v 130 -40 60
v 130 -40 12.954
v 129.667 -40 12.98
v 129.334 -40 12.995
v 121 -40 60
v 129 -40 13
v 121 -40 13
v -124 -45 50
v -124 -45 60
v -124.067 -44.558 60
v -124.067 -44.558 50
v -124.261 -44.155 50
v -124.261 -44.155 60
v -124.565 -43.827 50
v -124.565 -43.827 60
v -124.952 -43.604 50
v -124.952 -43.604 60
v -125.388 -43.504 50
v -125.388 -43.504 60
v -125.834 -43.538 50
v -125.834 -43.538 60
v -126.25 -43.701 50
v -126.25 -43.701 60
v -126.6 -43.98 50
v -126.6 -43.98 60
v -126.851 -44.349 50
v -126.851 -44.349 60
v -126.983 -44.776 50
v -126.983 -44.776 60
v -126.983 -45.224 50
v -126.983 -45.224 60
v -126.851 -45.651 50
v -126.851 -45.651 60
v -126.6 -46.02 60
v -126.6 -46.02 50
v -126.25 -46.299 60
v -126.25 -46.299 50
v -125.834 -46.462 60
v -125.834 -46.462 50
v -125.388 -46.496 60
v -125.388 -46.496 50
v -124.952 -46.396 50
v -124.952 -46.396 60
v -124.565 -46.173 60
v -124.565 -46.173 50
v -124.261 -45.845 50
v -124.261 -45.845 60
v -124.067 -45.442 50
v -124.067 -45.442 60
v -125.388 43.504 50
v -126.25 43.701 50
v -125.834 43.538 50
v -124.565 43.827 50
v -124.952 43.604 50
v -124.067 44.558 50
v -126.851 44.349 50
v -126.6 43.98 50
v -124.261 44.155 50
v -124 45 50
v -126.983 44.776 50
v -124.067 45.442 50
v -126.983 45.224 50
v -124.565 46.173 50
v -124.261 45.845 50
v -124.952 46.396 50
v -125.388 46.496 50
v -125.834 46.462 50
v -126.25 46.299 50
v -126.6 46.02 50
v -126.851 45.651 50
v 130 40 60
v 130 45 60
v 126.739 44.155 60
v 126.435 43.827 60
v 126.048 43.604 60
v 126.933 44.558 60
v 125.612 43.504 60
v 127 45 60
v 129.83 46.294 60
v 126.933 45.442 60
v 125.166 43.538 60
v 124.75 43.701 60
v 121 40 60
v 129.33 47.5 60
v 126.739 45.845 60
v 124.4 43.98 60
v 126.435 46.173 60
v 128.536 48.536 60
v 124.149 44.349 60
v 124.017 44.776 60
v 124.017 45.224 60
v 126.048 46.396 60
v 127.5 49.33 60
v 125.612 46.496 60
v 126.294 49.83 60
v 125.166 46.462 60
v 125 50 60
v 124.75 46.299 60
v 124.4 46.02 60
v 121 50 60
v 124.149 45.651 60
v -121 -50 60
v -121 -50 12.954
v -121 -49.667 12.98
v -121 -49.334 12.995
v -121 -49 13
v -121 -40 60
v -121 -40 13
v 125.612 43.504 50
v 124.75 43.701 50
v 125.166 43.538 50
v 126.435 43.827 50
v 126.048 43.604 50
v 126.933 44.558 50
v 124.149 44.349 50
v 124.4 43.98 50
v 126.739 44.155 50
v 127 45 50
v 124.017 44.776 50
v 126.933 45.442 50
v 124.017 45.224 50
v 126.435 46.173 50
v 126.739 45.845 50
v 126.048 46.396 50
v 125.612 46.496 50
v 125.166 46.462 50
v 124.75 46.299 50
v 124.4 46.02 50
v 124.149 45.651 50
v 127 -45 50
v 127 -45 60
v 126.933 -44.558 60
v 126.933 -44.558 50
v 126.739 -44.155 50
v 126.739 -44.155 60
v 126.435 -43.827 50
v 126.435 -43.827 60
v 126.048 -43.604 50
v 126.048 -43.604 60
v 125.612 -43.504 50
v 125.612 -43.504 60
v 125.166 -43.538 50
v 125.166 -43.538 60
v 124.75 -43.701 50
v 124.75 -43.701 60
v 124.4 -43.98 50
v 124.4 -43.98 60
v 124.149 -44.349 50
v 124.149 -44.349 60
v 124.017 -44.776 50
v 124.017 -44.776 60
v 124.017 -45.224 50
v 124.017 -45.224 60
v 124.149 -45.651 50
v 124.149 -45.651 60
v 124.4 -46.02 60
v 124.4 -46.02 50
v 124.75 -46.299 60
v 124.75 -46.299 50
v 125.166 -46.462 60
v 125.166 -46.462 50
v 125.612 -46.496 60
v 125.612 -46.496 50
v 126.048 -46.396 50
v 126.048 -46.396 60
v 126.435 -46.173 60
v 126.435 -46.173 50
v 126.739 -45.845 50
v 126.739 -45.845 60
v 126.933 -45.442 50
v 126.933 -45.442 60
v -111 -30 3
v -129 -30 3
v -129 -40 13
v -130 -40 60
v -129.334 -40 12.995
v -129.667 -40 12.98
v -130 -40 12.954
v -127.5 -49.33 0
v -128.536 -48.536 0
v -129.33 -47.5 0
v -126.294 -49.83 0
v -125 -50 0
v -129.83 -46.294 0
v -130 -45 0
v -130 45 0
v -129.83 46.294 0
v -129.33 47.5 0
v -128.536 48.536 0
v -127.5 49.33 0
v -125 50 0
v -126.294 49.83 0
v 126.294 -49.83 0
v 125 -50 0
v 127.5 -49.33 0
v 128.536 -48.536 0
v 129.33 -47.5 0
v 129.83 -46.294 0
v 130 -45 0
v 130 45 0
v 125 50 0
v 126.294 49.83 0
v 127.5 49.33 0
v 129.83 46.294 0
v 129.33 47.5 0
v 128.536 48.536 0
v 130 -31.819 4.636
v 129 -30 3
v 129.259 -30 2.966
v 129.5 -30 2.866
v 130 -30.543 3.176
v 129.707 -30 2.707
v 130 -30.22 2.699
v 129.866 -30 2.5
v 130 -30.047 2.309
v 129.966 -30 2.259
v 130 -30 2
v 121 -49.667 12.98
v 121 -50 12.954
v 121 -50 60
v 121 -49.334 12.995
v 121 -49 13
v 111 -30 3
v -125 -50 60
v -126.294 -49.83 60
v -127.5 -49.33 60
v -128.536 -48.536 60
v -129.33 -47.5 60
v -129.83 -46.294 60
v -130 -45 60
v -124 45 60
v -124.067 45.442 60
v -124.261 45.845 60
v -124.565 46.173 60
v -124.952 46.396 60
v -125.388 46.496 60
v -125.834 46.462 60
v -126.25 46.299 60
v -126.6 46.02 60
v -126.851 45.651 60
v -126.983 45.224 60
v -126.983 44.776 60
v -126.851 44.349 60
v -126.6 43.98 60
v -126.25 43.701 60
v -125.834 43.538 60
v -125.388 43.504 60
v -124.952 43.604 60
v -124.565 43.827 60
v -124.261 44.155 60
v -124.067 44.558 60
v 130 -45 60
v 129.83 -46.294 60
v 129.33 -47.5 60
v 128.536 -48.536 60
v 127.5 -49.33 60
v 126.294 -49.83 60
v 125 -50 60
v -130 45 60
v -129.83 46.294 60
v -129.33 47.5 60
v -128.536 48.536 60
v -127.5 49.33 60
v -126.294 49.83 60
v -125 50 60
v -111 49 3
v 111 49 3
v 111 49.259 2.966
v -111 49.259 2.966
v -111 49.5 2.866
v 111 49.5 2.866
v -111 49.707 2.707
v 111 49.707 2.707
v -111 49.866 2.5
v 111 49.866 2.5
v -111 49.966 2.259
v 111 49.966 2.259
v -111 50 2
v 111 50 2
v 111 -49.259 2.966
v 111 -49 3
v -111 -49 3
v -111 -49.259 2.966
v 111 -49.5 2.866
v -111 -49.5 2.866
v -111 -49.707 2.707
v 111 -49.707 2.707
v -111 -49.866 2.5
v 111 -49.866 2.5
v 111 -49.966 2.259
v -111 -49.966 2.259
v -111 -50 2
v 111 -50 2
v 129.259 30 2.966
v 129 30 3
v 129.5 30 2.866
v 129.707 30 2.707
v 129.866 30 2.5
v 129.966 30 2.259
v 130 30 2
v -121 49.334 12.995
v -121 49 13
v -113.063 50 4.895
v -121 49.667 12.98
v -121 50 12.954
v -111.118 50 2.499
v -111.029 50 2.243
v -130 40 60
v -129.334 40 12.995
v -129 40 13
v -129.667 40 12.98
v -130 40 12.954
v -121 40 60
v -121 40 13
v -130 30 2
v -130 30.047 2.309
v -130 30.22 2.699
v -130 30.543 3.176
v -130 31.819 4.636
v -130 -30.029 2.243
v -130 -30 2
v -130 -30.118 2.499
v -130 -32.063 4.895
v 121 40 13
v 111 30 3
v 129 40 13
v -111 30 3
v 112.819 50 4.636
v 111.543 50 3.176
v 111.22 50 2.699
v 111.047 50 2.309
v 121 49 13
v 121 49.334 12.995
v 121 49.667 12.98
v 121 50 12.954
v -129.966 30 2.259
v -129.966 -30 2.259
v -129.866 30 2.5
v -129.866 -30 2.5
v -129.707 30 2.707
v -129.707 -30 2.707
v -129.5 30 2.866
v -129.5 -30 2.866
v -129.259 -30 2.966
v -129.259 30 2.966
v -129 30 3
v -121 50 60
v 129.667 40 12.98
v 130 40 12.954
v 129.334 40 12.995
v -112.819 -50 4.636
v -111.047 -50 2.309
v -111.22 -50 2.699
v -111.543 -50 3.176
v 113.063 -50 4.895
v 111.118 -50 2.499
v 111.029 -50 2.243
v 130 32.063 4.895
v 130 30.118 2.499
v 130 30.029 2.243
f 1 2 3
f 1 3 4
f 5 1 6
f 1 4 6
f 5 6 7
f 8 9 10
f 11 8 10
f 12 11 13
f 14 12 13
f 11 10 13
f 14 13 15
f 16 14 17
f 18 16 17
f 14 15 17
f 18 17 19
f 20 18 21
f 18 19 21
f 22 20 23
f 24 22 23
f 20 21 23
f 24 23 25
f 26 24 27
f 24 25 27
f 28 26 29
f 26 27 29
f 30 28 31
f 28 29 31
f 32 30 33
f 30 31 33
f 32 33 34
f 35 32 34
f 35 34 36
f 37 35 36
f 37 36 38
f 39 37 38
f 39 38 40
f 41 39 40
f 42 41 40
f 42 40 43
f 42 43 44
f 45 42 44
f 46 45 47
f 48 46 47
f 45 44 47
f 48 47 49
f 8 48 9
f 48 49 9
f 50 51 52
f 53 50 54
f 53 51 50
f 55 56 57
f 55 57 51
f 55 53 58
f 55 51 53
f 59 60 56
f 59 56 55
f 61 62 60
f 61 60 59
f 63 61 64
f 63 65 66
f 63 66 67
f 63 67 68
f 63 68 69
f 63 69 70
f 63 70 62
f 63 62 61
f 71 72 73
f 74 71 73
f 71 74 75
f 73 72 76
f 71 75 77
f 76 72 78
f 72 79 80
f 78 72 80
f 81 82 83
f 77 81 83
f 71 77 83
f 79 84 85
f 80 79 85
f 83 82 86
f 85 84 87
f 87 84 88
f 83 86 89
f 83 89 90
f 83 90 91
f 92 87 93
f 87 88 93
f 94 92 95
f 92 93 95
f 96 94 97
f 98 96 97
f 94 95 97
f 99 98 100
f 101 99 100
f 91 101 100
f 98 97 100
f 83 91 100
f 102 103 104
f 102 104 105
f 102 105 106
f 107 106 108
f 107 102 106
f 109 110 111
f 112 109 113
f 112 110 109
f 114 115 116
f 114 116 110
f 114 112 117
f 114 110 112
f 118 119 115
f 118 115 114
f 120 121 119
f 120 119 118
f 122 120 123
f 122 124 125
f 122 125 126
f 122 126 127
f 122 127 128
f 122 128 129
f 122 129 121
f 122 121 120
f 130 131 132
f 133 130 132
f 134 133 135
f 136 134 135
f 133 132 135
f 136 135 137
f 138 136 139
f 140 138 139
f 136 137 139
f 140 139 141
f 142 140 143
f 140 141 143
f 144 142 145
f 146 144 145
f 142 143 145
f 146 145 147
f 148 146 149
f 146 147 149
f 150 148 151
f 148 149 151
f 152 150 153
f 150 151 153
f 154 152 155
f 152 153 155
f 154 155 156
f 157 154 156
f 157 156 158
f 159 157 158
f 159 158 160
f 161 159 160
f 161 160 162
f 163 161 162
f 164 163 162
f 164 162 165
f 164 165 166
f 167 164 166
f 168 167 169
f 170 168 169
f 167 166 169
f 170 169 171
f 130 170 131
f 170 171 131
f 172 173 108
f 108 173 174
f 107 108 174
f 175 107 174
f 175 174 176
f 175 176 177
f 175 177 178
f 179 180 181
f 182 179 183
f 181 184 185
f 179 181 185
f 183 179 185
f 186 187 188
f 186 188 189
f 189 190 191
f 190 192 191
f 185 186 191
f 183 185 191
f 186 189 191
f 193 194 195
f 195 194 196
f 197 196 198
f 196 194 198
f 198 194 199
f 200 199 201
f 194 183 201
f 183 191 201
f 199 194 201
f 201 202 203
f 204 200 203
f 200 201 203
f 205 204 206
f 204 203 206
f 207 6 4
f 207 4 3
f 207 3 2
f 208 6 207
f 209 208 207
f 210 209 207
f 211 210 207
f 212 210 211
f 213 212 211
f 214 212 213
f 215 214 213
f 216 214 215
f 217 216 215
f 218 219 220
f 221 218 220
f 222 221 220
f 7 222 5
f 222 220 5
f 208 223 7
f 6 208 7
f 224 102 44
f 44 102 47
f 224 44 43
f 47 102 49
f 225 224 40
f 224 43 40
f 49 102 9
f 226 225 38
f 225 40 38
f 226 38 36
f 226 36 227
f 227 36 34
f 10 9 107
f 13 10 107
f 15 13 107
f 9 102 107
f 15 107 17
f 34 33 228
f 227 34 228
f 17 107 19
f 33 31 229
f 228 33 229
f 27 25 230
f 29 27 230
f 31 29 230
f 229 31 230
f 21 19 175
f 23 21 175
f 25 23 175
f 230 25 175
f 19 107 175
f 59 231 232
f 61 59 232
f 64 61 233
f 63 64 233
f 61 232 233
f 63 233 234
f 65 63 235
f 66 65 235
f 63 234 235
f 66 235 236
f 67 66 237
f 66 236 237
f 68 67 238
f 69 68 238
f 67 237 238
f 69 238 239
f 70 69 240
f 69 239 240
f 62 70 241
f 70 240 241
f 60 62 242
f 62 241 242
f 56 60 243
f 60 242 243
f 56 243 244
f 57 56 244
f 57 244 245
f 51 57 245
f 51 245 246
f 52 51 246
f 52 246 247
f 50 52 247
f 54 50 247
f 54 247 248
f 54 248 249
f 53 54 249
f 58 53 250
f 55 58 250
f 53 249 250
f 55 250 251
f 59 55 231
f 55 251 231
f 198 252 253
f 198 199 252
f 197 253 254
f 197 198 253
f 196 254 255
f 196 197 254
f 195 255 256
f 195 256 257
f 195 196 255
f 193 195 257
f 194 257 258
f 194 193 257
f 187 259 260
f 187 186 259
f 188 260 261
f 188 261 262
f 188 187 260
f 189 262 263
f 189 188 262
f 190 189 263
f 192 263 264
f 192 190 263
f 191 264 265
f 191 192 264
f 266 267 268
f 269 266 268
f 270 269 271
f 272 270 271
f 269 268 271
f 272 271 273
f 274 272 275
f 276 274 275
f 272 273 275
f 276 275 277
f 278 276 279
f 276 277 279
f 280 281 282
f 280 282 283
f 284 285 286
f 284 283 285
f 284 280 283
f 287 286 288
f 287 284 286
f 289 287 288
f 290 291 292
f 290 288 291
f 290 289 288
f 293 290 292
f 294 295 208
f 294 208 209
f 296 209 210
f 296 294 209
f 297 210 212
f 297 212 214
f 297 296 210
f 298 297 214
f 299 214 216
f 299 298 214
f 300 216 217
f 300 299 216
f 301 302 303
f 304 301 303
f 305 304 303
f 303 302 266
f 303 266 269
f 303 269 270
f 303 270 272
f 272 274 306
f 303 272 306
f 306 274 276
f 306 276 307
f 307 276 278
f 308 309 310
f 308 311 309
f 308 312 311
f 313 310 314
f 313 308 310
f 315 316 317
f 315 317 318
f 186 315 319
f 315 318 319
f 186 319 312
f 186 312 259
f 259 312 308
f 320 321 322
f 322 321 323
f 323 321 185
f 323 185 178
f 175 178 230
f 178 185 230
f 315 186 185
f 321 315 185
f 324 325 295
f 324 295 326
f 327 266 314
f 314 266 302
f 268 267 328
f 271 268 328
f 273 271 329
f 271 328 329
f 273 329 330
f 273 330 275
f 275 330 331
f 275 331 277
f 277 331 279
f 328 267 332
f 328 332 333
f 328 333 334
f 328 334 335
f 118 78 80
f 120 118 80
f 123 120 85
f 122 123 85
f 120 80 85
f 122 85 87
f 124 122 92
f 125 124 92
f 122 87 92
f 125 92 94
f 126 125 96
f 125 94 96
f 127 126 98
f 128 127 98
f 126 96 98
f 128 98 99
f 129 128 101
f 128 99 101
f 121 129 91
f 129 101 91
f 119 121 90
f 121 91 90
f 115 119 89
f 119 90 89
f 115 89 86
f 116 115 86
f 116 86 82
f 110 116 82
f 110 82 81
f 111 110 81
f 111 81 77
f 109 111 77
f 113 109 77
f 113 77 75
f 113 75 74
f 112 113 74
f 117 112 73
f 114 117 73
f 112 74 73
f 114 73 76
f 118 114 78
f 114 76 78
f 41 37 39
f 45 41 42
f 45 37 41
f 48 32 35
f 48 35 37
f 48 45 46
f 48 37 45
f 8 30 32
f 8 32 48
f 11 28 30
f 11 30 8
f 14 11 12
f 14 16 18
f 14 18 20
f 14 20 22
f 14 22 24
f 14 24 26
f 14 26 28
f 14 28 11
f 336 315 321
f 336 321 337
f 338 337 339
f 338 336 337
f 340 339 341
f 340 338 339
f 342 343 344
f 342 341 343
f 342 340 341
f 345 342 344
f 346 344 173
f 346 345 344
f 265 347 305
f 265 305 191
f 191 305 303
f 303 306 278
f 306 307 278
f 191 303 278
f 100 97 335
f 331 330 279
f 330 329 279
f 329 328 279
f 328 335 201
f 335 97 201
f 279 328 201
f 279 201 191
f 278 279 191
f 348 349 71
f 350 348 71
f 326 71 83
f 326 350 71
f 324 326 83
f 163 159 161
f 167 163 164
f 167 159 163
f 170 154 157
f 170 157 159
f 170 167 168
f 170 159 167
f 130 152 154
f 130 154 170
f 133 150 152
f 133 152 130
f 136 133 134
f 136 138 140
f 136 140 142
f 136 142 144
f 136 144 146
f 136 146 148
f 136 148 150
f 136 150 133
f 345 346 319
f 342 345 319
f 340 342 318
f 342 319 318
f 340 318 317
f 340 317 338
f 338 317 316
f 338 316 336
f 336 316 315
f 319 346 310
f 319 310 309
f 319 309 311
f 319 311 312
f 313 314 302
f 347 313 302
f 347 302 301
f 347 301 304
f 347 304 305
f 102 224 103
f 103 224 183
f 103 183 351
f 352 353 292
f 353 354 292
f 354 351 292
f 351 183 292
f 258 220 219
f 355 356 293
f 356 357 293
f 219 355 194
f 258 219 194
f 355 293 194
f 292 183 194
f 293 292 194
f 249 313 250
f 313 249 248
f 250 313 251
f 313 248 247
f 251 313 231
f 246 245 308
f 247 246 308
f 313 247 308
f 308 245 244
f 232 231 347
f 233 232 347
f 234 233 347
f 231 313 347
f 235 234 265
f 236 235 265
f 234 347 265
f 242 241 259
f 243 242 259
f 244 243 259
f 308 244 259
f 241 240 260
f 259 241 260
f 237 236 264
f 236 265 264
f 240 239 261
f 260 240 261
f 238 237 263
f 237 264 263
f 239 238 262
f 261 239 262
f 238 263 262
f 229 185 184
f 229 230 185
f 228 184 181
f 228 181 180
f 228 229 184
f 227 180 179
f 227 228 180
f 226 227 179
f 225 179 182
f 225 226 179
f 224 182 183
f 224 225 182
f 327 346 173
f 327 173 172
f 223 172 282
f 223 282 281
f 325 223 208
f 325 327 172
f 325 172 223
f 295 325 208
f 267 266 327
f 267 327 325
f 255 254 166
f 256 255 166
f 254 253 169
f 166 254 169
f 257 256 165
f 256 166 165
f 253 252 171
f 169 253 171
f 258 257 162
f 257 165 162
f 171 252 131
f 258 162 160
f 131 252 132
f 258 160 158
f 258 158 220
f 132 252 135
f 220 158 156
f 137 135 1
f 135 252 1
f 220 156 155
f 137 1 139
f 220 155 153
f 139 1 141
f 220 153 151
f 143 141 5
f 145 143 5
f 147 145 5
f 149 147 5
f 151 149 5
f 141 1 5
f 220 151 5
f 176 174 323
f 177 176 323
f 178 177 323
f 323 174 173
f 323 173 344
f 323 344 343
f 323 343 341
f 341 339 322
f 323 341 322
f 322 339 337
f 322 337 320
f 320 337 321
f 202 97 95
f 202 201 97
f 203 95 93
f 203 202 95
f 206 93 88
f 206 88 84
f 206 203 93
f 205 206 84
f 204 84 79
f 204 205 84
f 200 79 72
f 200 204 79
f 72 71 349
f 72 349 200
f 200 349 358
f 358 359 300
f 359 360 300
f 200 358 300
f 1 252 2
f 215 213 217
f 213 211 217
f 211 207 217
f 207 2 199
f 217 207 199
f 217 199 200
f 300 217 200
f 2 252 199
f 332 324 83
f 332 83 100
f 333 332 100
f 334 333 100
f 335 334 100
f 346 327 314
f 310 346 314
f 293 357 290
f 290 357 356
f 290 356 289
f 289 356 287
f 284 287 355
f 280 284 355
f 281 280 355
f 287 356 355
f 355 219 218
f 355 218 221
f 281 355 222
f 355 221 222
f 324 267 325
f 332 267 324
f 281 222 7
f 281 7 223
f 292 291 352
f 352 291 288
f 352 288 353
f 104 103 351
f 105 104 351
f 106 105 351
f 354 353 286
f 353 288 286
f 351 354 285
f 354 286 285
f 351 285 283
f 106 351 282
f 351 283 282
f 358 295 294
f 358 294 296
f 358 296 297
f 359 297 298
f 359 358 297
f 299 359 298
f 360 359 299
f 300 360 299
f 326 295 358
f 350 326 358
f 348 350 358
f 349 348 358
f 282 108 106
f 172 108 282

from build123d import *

# Parameters (mm, degrees)
SKETCH_1_W          = 260
SKETCH_1_H          = 100
EXTRUDE_1_DEPTH     = 3
SKETCH_2_W          = 9
SKETCH_2_H          = 10
EXTRUDE_2_DEPTH     = 60
FILLET_3_R          = 5
FILLET_4_R          = 1
SKETCH_3_R          = 1.5
CUT_EXTRUDE_1_DEPTH = 10
CHAMFER_1_SIZE      = 10


with BuildPart() as part:
    # 草图1 → 凸台-拉伸1 (new body)
    with BuildSketch(Plane.XY):
        Rectangle(SKETCH_1_W, SKETCH_1_H)
    extrude(amount=EXTRUDE_1_DEPTH)

    # 草图2 → 凸台-拉伸2 (add)
    with BuildSketch(Plane(origin=(0, 0, 0), x_dir=(-1, 0, 0), z_dir=(0, 0, -1))):
        with Locations((125.5, 45)):
            Rectangle(SKETCH_2_W, SKETCH_2_H)
        with Locations((125.5, -45)):
            Rectangle(SKETCH_2_W, SKETCH_2_H)
        with Locations((-125.5, -45)):
            Rectangle(SKETCH_2_W, SKETCH_2_H)
        with Locations((-125.5, 45)):
            Rectangle(SKETCH_2_W, SKETCH_2_H)
    extrude(amount=-EXTRUDE_2_DEPTH)

    # 圆角3
    fillet_3_edges = [part.edges().sort_by_distance(p)[0] for p in [
        (130, -50, 30),
        (-130, -50, 30),
        (-130, 50, 30),
        (130, 50, 30),
    ]]
    fillet(fillet_3_edges, radius=FILLET_3_R)

    # 圆角4
    fillet_4_edges = [part.edges().sort_by_distance(p)[0] for p in [
        (0, -50, 3),
        (-130, 0, 3),
        (130, 0, 3),
        (0, 50, 3),
    ]]
    fillet(fillet_4_edges, radius=FILLET_4_R)

    # 草图3 → 切除-拉伸1 (cut)
    with BuildSketch(Plane.XY.offset(60)):
        with Locations((125.5, -45)):
            Circle(SKETCH_3_R)
        with Locations((125.5, 45)):
            Circle(SKETCH_3_R)
        with Locations((-125.5, -45)):
            Circle(SKETCH_3_R)
        with Locations((-125.5, 45)):
            Circle(SKETCH_3_R)
    extrude(amount=-CUT_EXTRUDE_1_DEPTH, mode=Mode.SUBTRACT)

    # 倒角1
    # the kernel refuses this chamfer: 10 mm, written as the material it adds along each edge
    with BuildSketch(Plane(origin=(121, 40, 3), x_dir=(0, -1, 0), z_dir=(1, 0, 0))) as chamfer_1_piece_1:
        Polygon((CHAMFER_1_SIZE, 0), (0, -CHAMFER_1_SIZE), (0, 0), align=None)
    extrude(amount=8)
    with BuildSketch(Plane(origin=(-121, 49, 3), x_dir=(1, 0, 0), z_dir=(0, -1, 0))) as chamfer_1_piece_2:
        Polygon((CHAMFER_1_SIZE, 0), (0, CHAMFER_1_SIZE), (0, 0), align=None)
    extrude(amount=9)
    with BuildSketch(Plane(origin=(-129, -40, 3), x_dir=(0, 1, 0), z_dir=(1, 0, 0)), Plane(origin=(-121, 40, 3), x_dir=(0, -1, 0), z_dir=(-1, 0, 0)), Plane(origin=(121, -40, 3), x_dir=(0, 1, 0), z_dir=(1, 0, 0))) as chamfer_1_piece_3:
        Polygon((CHAMFER_1_SIZE, 0), (0, CHAMFER_1_SIZE), (0, 0), align=None)
    extrude(amount=8)
    with BuildSketch(Plane(origin=(121, -49, 3), x_dir=(0, 0, 1), z_dir=(0, 1, 0)), Plane(origin=(-121, -40, 3), x_dir=(0, 0, 1), z_dir=(0, -1, 0)), Plane(origin=(121, 49, 3), x_dir=(-1, 0, 0), z_dir=(0, -1, 0))) as chamfer_1_piece_4:
        Polygon((CHAMFER_1_SIZE, 0), (0, -CHAMFER_1_SIZE), (0, 0), align=None)
    extrude(amount=9)
    with BuildSketch(Plane(origin=(-121, 49, 2), x_dir=(0, 0, 1), z_dir=(0, -1, 0))) as chamfer_1_piece_5_section:
        Polygon((1 + CHAMFER_1_SIZE, 0), (1, -CHAMFER_1_SIZE), (1, 0), align=None)
    chamfer_1_piece_5 = revolve(axis=Axis((-121, 49, 2), (-1, 0, 0)), revolution_arc=359.64, mode=Mode.PRIVATE)
    chamfer_1_piece_5 = split(chamfer_1_piece_5, bisect_by=Plane(origin=(-121, 49, 0), z_dir=(0, 0, 1)), keep=Keep.TOP, mode=Mode.PRIVATE)
    chamfer_1_piece_5 = split(chamfer_1_piece_5, bisect_by=Plane(origin=(-121, 50, 2), z_dir=(0, -1, 0)), keep=Keep.TOP, mode=Mode.PRIVATE)
    add(chamfer_1_piece_5)
    with BuildSketch(Plane(origin=(121, 49, 2), x_dir=(0, 0, 1), z_dir=(0, -1, 0))) as chamfer_1_piece_6_section:
        Polygon((1, CHAMFER_1_SIZE), (1 + CHAMFER_1_SIZE, 0), (1, 0), align=None)
    chamfer_1_piece_6 = revolve(axis=Axis((121, 49, 2), (-1, 0, 0)), revolution_arc=359.64, mode=Mode.PRIVATE)
    chamfer_1_piece_6 = split(chamfer_1_piece_6, bisect_by=Plane(origin=(121, 49, 0), z_dir=(0, 0, 1)), keep=Keep.TOP, mode=Mode.PRIVATE)
    chamfer_1_piece_6 = split(chamfer_1_piece_6, bisect_by=Plane(origin=(121, 50, 2), z_dir=(0, -1, 0)), keep=Keep.TOP, mode=Mode.PRIVATE)
    add(chamfer_1_piece_6)
    with BuildSketch(Plane(origin=(-129, -40, 2), x_dir=(0, 0, 1), z_dir=(1, 0, 0))) as chamfer_1_piece_7_section:
        Polygon((1 + CHAMFER_1_SIZE, 0), (1, -CHAMFER_1_SIZE), (1, 0), align=None)
    chamfer_1_piece_7 = revolve(axis=Axis((-129, -40, 2), (0, -1, 0)), revolution_arc=359.64, mode=Mode.PRIVATE)
    chamfer_1_piece_7 = split(chamfer_1_piece_7, bisect_by=Plane(origin=(-129, -40, 0), z_dir=(0, 0, 1)), keep=Keep.TOP, mode=Mode.PRIVATE)
    chamfer_1_piece_7 = split(chamfer_1_piece_7, bisect_by=Plane(origin=(-130, -40, 2), z_dir=(1, 0, 0)), keep=Keep.TOP, mode=Mode.PRIVATE)
    add(chamfer_1_piece_7)
    with BuildSketch(Plane(origin=(-129, 40, 2), x_dir=(0, 0, 1), z_dir=(1, 0, 0))) as chamfer_1_piece_8_section:
        Polygon((1, CHAMFER_1_SIZE), (1 + CHAMFER_1_SIZE, 0), (1, 0), align=None)
    chamfer_1_piece_8 = revolve(axis=Axis((-129, 40, 2), (0, -1, 0)), revolution_arc=359.64, mode=Mode.PRIVATE)
    chamfer_1_piece_8 = split(chamfer_1_piece_8, bisect_by=Plane(origin=(-129, 40, 0), z_dir=(0, 0, 1)), keep=Keep.TOP, mode=Mode.PRIVATE)
    chamfer_1_piece_8 = split(chamfer_1_piece_8, bisect_by=Plane(origin=(-130, 40, 2), z_dir=(1, 0, 0)), keep=Keep.TOP, mode=Mode.PRIVATE)
    add(chamfer_1_piece_8)
    with BuildSketch(Plane(origin=(129, 40, 2), x_dir=(0, 0, 1), z_dir=(-1, 0, 0))) as chamfer_1_piece_9_section:
        Polygon((1, -CHAMFER_1_SIZE), (1 + CHAMFER_1_SIZE, 0), (1, 0), align=None)
    chamfer_1_piece_9 = revolve(axis=Axis((129, 40, 2), (0, 1, 0)), revolution_arc=359.64, mode=Mode.PRIVATE)
    chamfer_1_piece_9 = split(chamfer_1_piece_9, bisect_by=Plane(origin=(129, 40, 0), z_dir=(0, 0, 1)), keep=Keep.TOP, mode=Mode.PRIVATE)
    chamfer_1_piece_9 = split(chamfer_1_piece_9, bisect_by=Plane(origin=(130, 40, 2), z_dir=(-1, 0, 0)), keep=Keep.TOP, mode=Mode.PRIVATE)
    add(chamfer_1_piece_9)
    with BuildSketch(Plane(origin=(129, -40, 2), x_dir=(0, 0, 1), z_dir=(-1, 0, 0))) as chamfer_1_piece_10_section:
        Polygon((1 + CHAMFER_1_SIZE, 0), (1, CHAMFER_1_SIZE), (1, 0), align=None)
    chamfer_1_piece_10 = revolve(axis=Axis((129, -40, 2), (0, 1, 0)), revolution_arc=359.64, mode=Mode.PRIVATE)
    chamfer_1_piece_10 = split(chamfer_1_piece_10, bisect_by=Plane(origin=(129, -40, 0), z_dir=(0, 0, 1)), keep=Keep.TOP, mode=Mode.PRIVATE)
    chamfer_1_piece_10 = split(chamfer_1_piece_10, bisect_by=Plane(origin=(130, -40, 2), z_dir=(-1, 0, 0)), keep=Keep.TOP, mode=Mode.PRIVATE)
    add(chamfer_1_piece_10)
    with BuildSketch(Plane(origin=(121, -49, 2), x_dir=(0, 0.006283143965553963, 0.9999802608561372), z_dir=(0, -0.9999802608561372, 0.006283143965553963))) as chamfer_1_piece_11_section:
        Polygon((1, CHAMFER_1_SIZE), (1 + CHAMFER_1_SIZE, 0), (1, 0), align=None)
    chamfer_1_piece_11 = revolve(axis=Axis((121, -49, 2), (-1, 0, 0)), revolution_arc=359.64, mode=Mode.PRIVATE)
    chamfer_1_piece_11 = split(chamfer_1_piece_11, bisect_by=Plane(origin=(121, -50, 2), z_dir=(0, 1, 0)), keep=Keep.TOP, mode=Mode.PRIVATE)
    chamfer_1_piece_11 = split(chamfer_1_piece_11, bisect_by=Plane(origin=(121, -49, 0), z_dir=(0, 0, 1)), keep=Keep.TOP, mode=Mode.PRIVATE)
    add(chamfer_1_piece_11)
    with BuildSketch(Plane(origin=(-121, -49, 2), x_dir=(0, 0.006283143965553963, 0.9999802608561372), z_dir=(0, -0.9999802608561372, 0.006283143965553963))) as chamfer_1_piece_12_section:
        Polygon((1 + CHAMFER_1_SIZE, 0), (1, -CHAMFER_1_SIZE), (1, 0), align=None)
    chamfer_1_piece_12 = revolve(axis=Axis((-121, -49, 2), (-1, 0, 0)), revolution_arc=359.64, mode=Mode.PRIVATE)
    chamfer_1_piece_12 = split(chamfer_1_piece_12, bisect_by=Plane(origin=(-121, -50, 2), z_dir=(0, 1, 0)), keep=Keep.TOP, mode=Mode.PRIVATE)
    chamfer_1_piece_12 = split(chamfer_1_piece_12, bisect_by=Plane(origin=(-121, -49, 0), z_dir=(0, 0, 1)), keep=Keep.TOP, mode=Mode.PRIVATE)
    add(chamfer_1_piece_12)
    with BuildSketch(Plane(origin=(95.28317012, 40, 3), x_dir=(0, -1, 0), z_dir=(1, 0, 0))) as chamfer_1_piece_13a_section:
        Polygon((CHAMFER_1_SIZE, 0), (0, -CHAMFER_1_SIZE), (0, 0), align=None)
    chamfer_1_piece_13a = extrude(amount=33.71682988, mode=Mode.PRIVATE)
    chamfer_1_piece_13a = split(chamfer_1_piece_13a, bisect_by=Plane(origin=(121, 40, 3), z_dir=(-1, 0, 0)), keep=Keep.TOP, mode=Mode.PRIVATE)
    with BuildSketch(Plane(origin=(121, 49, 3), x_dir=(-1, 0, 0), z_dir=(0, -1, 0))) as chamfer_1_piece_13b_section:
        Polygon((CHAMFER_1_SIZE, 0), (0, -CHAMFER_1_SIZE), (0, 0), align=None)
    chamfer_1_piece_13b = extrude(amount=34.71682988, mode=Mode.PRIVATE)
    chamfer_1_piece_13b = split(chamfer_1_piece_13b, bisect_by=Plane(origin=(121, 40, 3), z_dir=(0, -1, 0)), keep=Keep.TOP, mode=Mode.PRIVATE)
    chamfer_1_piece_13 = chamfer_1_piece_13a & chamfer_1_piece_13b
    add(chamfer_1_piece_13)
    with BuildSketch(Plane(origin=(-95.28317012, 40, 3), x_dir=(0, -1, 0), z_dir=(-1, 0, 0))) as chamfer_1_piece_14a_section:
        Polygon((CHAMFER_1_SIZE, 0), (0, CHAMFER_1_SIZE), (0, 0), align=None)
    chamfer_1_piece_14a = extrude(amount=33.71682988, mode=Mode.PRIVATE)
    chamfer_1_piece_14a = split(chamfer_1_piece_14a, bisect_by=Plane(origin=(-121, 40, 3), z_dir=(1, 0, 0)), keep=Keep.TOP, mode=Mode.PRIVATE)
    with BuildSketch(Plane(origin=(-121, 49, 3), x_dir=(1, 0, 0), z_dir=(0, -1, 0))) as chamfer_1_piece_14b_section:
        Polygon((CHAMFER_1_SIZE, 0), (0, CHAMFER_1_SIZE), (0, 0), align=None)
    chamfer_1_piece_14b = extrude(amount=34.71682988, mode=Mode.PRIVATE)
    chamfer_1_piece_14b = split(chamfer_1_piece_14b, bisect_by=Plane(origin=(-121, 40, 3), z_dir=(0, -1, 0)), keep=Keep.TOP, mode=Mode.PRIVATE)
    chamfer_1_piece_14 = chamfer_1_piece_14a & chamfer_1_piece_14b
    add(chamfer_1_piece_14)
    with BuildSketch(Plane(origin=(-121, -14.28317012, 3), x_dir=(0, 0, 1), z_dir=(0, -1, 0))) as chamfer_1_piece_15a_section:
        Polygon((CHAMFER_1_SIZE, 0), (0, -CHAMFER_1_SIZE), (0, 0), align=None)
    chamfer_1_piece_15a = extrude(amount=34.71682988, mode=Mode.PRIVATE)
    chamfer_1_piece_15a = split(chamfer_1_piece_15a, bisect_by=Plane(origin=(-121, -40, 3), z_dir=(0, 1, 0)), keep=Keep.TOP, mode=Mode.PRIVATE)
    with BuildSketch(Plane(origin=(-129, -40, 3), x_dir=(0, 1, 0), z_dir=(1, 0, 0))) as chamfer_1_piece_15b_section:
        Polygon((CHAMFER_1_SIZE, 0), (0, CHAMFER_1_SIZE), (0, 0), align=None)
    chamfer_1_piece_15b = extrude(amount=33.71682988, mode=Mode.PRIVATE)
    chamfer_1_piece_15b = split(chamfer_1_piece_15b, bisect_by=Plane(origin=(-121, -40, 3), z_dir=(1, 0, 0)), keep=Keep.TOP, mode=Mode.PRIVATE)
    chamfer_1_piece_15 = chamfer_1_piece_15a & chamfer_1_piece_15b
    add(chamfer_1_piece_15)
    with BuildSketch(Plane(origin=(121, -49, 3), x_dir=(0, 0, 1), z_dir=(0, 1, 0))) as chamfer_1_piece_16a_section:
        Polygon((CHAMFER_1_SIZE, 0), (0, -CHAMFER_1_SIZE), (0, 0), align=None)
    chamfer_1_piece_16a = extrude(amount=34.71682988, mode=Mode.PRIVATE)
    chamfer_1_piece_16a = split(chamfer_1_piece_16a, bisect_by=Plane(origin=(121, -40, 3), z_dir=(0, 1, 0)), keep=Keep.TOP, mode=Mode.PRIVATE)
    with BuildSketch(Plane(origin=(95.28317012, -40, 3), x_dir=(0, 1, 0), z_dir=(1, 0, 0))) as chamfer_1_piece_16b_section:
        Polygon((CHAMFER_1_SIZE, 0), (0, CHAMFER_1_SIZE), (0, 0), align=None)
    chamfer_1_piece_16b = extrude(amount=33.71682988, mode=Mode.PRIVATE)
    chamfer_1_piece_16b = split(chamfer_1_piece_16b, bisect_by=Plane(origin=(121, -40, 3), z_dir=(-1, 0, 0)), keep=Keep.TOP, mode=Mode.PRIVATE)
    chamfer_1_piece_16 = chamfer_1_piece_16a & chamfer_1_piece_16b
    add(chamfer_1_piece_16)


solid = part.part
